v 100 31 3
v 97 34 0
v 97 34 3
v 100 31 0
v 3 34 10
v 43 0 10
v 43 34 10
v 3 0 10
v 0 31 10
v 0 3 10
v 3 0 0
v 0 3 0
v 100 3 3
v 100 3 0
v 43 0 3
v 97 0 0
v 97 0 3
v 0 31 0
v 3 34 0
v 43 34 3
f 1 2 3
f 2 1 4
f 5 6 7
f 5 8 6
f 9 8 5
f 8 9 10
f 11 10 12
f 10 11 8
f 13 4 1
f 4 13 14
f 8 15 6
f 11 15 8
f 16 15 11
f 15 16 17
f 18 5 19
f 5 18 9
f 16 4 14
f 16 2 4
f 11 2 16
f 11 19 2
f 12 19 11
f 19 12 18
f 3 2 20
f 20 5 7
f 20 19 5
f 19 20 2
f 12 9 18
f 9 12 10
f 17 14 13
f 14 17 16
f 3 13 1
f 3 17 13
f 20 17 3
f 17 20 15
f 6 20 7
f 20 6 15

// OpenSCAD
$fn = 32;

// ----------------------------------------------------------------------
// Stepped bar: endstep, 100 x 34 x 10/3 mm
// ----------------------------------------------------------------------

// --- parameters (mm) ---
bar_l = 100;              // bar length, X
bar_w = 34;               // bar width, Y
plate_t = 10;             // thickness of the thick zone, Z
thin_t = 3;               // thickness of the thin zone
corner_c = 3;             // corner chamfer of the bar
step_cut = 7;             // material removed from the thin zone
step_x = 43;              // step position from the left end
depth_1 = 7;              // depth of cut 1 from the top face

profile = [[3, 0], [97, 0], [100, 3], [100, 31], [97, 34], [3, 34], [0, 31], [0, 3]];  // primary outline, 8 points, counter clockwise
void_1 = [[43, -1], [101, -1], [101, 35], [43, 35]];  // thin zone beyond the step, 4 points

// --- the one profile operation ---
difference() {
  linear_extrude(height = plate_t) polygon(points = profile);
  translate([0, 0, plate_t - depth_1])
    linear_extrude(height = depth_1 + 1) polygon(points = void_1);
}
